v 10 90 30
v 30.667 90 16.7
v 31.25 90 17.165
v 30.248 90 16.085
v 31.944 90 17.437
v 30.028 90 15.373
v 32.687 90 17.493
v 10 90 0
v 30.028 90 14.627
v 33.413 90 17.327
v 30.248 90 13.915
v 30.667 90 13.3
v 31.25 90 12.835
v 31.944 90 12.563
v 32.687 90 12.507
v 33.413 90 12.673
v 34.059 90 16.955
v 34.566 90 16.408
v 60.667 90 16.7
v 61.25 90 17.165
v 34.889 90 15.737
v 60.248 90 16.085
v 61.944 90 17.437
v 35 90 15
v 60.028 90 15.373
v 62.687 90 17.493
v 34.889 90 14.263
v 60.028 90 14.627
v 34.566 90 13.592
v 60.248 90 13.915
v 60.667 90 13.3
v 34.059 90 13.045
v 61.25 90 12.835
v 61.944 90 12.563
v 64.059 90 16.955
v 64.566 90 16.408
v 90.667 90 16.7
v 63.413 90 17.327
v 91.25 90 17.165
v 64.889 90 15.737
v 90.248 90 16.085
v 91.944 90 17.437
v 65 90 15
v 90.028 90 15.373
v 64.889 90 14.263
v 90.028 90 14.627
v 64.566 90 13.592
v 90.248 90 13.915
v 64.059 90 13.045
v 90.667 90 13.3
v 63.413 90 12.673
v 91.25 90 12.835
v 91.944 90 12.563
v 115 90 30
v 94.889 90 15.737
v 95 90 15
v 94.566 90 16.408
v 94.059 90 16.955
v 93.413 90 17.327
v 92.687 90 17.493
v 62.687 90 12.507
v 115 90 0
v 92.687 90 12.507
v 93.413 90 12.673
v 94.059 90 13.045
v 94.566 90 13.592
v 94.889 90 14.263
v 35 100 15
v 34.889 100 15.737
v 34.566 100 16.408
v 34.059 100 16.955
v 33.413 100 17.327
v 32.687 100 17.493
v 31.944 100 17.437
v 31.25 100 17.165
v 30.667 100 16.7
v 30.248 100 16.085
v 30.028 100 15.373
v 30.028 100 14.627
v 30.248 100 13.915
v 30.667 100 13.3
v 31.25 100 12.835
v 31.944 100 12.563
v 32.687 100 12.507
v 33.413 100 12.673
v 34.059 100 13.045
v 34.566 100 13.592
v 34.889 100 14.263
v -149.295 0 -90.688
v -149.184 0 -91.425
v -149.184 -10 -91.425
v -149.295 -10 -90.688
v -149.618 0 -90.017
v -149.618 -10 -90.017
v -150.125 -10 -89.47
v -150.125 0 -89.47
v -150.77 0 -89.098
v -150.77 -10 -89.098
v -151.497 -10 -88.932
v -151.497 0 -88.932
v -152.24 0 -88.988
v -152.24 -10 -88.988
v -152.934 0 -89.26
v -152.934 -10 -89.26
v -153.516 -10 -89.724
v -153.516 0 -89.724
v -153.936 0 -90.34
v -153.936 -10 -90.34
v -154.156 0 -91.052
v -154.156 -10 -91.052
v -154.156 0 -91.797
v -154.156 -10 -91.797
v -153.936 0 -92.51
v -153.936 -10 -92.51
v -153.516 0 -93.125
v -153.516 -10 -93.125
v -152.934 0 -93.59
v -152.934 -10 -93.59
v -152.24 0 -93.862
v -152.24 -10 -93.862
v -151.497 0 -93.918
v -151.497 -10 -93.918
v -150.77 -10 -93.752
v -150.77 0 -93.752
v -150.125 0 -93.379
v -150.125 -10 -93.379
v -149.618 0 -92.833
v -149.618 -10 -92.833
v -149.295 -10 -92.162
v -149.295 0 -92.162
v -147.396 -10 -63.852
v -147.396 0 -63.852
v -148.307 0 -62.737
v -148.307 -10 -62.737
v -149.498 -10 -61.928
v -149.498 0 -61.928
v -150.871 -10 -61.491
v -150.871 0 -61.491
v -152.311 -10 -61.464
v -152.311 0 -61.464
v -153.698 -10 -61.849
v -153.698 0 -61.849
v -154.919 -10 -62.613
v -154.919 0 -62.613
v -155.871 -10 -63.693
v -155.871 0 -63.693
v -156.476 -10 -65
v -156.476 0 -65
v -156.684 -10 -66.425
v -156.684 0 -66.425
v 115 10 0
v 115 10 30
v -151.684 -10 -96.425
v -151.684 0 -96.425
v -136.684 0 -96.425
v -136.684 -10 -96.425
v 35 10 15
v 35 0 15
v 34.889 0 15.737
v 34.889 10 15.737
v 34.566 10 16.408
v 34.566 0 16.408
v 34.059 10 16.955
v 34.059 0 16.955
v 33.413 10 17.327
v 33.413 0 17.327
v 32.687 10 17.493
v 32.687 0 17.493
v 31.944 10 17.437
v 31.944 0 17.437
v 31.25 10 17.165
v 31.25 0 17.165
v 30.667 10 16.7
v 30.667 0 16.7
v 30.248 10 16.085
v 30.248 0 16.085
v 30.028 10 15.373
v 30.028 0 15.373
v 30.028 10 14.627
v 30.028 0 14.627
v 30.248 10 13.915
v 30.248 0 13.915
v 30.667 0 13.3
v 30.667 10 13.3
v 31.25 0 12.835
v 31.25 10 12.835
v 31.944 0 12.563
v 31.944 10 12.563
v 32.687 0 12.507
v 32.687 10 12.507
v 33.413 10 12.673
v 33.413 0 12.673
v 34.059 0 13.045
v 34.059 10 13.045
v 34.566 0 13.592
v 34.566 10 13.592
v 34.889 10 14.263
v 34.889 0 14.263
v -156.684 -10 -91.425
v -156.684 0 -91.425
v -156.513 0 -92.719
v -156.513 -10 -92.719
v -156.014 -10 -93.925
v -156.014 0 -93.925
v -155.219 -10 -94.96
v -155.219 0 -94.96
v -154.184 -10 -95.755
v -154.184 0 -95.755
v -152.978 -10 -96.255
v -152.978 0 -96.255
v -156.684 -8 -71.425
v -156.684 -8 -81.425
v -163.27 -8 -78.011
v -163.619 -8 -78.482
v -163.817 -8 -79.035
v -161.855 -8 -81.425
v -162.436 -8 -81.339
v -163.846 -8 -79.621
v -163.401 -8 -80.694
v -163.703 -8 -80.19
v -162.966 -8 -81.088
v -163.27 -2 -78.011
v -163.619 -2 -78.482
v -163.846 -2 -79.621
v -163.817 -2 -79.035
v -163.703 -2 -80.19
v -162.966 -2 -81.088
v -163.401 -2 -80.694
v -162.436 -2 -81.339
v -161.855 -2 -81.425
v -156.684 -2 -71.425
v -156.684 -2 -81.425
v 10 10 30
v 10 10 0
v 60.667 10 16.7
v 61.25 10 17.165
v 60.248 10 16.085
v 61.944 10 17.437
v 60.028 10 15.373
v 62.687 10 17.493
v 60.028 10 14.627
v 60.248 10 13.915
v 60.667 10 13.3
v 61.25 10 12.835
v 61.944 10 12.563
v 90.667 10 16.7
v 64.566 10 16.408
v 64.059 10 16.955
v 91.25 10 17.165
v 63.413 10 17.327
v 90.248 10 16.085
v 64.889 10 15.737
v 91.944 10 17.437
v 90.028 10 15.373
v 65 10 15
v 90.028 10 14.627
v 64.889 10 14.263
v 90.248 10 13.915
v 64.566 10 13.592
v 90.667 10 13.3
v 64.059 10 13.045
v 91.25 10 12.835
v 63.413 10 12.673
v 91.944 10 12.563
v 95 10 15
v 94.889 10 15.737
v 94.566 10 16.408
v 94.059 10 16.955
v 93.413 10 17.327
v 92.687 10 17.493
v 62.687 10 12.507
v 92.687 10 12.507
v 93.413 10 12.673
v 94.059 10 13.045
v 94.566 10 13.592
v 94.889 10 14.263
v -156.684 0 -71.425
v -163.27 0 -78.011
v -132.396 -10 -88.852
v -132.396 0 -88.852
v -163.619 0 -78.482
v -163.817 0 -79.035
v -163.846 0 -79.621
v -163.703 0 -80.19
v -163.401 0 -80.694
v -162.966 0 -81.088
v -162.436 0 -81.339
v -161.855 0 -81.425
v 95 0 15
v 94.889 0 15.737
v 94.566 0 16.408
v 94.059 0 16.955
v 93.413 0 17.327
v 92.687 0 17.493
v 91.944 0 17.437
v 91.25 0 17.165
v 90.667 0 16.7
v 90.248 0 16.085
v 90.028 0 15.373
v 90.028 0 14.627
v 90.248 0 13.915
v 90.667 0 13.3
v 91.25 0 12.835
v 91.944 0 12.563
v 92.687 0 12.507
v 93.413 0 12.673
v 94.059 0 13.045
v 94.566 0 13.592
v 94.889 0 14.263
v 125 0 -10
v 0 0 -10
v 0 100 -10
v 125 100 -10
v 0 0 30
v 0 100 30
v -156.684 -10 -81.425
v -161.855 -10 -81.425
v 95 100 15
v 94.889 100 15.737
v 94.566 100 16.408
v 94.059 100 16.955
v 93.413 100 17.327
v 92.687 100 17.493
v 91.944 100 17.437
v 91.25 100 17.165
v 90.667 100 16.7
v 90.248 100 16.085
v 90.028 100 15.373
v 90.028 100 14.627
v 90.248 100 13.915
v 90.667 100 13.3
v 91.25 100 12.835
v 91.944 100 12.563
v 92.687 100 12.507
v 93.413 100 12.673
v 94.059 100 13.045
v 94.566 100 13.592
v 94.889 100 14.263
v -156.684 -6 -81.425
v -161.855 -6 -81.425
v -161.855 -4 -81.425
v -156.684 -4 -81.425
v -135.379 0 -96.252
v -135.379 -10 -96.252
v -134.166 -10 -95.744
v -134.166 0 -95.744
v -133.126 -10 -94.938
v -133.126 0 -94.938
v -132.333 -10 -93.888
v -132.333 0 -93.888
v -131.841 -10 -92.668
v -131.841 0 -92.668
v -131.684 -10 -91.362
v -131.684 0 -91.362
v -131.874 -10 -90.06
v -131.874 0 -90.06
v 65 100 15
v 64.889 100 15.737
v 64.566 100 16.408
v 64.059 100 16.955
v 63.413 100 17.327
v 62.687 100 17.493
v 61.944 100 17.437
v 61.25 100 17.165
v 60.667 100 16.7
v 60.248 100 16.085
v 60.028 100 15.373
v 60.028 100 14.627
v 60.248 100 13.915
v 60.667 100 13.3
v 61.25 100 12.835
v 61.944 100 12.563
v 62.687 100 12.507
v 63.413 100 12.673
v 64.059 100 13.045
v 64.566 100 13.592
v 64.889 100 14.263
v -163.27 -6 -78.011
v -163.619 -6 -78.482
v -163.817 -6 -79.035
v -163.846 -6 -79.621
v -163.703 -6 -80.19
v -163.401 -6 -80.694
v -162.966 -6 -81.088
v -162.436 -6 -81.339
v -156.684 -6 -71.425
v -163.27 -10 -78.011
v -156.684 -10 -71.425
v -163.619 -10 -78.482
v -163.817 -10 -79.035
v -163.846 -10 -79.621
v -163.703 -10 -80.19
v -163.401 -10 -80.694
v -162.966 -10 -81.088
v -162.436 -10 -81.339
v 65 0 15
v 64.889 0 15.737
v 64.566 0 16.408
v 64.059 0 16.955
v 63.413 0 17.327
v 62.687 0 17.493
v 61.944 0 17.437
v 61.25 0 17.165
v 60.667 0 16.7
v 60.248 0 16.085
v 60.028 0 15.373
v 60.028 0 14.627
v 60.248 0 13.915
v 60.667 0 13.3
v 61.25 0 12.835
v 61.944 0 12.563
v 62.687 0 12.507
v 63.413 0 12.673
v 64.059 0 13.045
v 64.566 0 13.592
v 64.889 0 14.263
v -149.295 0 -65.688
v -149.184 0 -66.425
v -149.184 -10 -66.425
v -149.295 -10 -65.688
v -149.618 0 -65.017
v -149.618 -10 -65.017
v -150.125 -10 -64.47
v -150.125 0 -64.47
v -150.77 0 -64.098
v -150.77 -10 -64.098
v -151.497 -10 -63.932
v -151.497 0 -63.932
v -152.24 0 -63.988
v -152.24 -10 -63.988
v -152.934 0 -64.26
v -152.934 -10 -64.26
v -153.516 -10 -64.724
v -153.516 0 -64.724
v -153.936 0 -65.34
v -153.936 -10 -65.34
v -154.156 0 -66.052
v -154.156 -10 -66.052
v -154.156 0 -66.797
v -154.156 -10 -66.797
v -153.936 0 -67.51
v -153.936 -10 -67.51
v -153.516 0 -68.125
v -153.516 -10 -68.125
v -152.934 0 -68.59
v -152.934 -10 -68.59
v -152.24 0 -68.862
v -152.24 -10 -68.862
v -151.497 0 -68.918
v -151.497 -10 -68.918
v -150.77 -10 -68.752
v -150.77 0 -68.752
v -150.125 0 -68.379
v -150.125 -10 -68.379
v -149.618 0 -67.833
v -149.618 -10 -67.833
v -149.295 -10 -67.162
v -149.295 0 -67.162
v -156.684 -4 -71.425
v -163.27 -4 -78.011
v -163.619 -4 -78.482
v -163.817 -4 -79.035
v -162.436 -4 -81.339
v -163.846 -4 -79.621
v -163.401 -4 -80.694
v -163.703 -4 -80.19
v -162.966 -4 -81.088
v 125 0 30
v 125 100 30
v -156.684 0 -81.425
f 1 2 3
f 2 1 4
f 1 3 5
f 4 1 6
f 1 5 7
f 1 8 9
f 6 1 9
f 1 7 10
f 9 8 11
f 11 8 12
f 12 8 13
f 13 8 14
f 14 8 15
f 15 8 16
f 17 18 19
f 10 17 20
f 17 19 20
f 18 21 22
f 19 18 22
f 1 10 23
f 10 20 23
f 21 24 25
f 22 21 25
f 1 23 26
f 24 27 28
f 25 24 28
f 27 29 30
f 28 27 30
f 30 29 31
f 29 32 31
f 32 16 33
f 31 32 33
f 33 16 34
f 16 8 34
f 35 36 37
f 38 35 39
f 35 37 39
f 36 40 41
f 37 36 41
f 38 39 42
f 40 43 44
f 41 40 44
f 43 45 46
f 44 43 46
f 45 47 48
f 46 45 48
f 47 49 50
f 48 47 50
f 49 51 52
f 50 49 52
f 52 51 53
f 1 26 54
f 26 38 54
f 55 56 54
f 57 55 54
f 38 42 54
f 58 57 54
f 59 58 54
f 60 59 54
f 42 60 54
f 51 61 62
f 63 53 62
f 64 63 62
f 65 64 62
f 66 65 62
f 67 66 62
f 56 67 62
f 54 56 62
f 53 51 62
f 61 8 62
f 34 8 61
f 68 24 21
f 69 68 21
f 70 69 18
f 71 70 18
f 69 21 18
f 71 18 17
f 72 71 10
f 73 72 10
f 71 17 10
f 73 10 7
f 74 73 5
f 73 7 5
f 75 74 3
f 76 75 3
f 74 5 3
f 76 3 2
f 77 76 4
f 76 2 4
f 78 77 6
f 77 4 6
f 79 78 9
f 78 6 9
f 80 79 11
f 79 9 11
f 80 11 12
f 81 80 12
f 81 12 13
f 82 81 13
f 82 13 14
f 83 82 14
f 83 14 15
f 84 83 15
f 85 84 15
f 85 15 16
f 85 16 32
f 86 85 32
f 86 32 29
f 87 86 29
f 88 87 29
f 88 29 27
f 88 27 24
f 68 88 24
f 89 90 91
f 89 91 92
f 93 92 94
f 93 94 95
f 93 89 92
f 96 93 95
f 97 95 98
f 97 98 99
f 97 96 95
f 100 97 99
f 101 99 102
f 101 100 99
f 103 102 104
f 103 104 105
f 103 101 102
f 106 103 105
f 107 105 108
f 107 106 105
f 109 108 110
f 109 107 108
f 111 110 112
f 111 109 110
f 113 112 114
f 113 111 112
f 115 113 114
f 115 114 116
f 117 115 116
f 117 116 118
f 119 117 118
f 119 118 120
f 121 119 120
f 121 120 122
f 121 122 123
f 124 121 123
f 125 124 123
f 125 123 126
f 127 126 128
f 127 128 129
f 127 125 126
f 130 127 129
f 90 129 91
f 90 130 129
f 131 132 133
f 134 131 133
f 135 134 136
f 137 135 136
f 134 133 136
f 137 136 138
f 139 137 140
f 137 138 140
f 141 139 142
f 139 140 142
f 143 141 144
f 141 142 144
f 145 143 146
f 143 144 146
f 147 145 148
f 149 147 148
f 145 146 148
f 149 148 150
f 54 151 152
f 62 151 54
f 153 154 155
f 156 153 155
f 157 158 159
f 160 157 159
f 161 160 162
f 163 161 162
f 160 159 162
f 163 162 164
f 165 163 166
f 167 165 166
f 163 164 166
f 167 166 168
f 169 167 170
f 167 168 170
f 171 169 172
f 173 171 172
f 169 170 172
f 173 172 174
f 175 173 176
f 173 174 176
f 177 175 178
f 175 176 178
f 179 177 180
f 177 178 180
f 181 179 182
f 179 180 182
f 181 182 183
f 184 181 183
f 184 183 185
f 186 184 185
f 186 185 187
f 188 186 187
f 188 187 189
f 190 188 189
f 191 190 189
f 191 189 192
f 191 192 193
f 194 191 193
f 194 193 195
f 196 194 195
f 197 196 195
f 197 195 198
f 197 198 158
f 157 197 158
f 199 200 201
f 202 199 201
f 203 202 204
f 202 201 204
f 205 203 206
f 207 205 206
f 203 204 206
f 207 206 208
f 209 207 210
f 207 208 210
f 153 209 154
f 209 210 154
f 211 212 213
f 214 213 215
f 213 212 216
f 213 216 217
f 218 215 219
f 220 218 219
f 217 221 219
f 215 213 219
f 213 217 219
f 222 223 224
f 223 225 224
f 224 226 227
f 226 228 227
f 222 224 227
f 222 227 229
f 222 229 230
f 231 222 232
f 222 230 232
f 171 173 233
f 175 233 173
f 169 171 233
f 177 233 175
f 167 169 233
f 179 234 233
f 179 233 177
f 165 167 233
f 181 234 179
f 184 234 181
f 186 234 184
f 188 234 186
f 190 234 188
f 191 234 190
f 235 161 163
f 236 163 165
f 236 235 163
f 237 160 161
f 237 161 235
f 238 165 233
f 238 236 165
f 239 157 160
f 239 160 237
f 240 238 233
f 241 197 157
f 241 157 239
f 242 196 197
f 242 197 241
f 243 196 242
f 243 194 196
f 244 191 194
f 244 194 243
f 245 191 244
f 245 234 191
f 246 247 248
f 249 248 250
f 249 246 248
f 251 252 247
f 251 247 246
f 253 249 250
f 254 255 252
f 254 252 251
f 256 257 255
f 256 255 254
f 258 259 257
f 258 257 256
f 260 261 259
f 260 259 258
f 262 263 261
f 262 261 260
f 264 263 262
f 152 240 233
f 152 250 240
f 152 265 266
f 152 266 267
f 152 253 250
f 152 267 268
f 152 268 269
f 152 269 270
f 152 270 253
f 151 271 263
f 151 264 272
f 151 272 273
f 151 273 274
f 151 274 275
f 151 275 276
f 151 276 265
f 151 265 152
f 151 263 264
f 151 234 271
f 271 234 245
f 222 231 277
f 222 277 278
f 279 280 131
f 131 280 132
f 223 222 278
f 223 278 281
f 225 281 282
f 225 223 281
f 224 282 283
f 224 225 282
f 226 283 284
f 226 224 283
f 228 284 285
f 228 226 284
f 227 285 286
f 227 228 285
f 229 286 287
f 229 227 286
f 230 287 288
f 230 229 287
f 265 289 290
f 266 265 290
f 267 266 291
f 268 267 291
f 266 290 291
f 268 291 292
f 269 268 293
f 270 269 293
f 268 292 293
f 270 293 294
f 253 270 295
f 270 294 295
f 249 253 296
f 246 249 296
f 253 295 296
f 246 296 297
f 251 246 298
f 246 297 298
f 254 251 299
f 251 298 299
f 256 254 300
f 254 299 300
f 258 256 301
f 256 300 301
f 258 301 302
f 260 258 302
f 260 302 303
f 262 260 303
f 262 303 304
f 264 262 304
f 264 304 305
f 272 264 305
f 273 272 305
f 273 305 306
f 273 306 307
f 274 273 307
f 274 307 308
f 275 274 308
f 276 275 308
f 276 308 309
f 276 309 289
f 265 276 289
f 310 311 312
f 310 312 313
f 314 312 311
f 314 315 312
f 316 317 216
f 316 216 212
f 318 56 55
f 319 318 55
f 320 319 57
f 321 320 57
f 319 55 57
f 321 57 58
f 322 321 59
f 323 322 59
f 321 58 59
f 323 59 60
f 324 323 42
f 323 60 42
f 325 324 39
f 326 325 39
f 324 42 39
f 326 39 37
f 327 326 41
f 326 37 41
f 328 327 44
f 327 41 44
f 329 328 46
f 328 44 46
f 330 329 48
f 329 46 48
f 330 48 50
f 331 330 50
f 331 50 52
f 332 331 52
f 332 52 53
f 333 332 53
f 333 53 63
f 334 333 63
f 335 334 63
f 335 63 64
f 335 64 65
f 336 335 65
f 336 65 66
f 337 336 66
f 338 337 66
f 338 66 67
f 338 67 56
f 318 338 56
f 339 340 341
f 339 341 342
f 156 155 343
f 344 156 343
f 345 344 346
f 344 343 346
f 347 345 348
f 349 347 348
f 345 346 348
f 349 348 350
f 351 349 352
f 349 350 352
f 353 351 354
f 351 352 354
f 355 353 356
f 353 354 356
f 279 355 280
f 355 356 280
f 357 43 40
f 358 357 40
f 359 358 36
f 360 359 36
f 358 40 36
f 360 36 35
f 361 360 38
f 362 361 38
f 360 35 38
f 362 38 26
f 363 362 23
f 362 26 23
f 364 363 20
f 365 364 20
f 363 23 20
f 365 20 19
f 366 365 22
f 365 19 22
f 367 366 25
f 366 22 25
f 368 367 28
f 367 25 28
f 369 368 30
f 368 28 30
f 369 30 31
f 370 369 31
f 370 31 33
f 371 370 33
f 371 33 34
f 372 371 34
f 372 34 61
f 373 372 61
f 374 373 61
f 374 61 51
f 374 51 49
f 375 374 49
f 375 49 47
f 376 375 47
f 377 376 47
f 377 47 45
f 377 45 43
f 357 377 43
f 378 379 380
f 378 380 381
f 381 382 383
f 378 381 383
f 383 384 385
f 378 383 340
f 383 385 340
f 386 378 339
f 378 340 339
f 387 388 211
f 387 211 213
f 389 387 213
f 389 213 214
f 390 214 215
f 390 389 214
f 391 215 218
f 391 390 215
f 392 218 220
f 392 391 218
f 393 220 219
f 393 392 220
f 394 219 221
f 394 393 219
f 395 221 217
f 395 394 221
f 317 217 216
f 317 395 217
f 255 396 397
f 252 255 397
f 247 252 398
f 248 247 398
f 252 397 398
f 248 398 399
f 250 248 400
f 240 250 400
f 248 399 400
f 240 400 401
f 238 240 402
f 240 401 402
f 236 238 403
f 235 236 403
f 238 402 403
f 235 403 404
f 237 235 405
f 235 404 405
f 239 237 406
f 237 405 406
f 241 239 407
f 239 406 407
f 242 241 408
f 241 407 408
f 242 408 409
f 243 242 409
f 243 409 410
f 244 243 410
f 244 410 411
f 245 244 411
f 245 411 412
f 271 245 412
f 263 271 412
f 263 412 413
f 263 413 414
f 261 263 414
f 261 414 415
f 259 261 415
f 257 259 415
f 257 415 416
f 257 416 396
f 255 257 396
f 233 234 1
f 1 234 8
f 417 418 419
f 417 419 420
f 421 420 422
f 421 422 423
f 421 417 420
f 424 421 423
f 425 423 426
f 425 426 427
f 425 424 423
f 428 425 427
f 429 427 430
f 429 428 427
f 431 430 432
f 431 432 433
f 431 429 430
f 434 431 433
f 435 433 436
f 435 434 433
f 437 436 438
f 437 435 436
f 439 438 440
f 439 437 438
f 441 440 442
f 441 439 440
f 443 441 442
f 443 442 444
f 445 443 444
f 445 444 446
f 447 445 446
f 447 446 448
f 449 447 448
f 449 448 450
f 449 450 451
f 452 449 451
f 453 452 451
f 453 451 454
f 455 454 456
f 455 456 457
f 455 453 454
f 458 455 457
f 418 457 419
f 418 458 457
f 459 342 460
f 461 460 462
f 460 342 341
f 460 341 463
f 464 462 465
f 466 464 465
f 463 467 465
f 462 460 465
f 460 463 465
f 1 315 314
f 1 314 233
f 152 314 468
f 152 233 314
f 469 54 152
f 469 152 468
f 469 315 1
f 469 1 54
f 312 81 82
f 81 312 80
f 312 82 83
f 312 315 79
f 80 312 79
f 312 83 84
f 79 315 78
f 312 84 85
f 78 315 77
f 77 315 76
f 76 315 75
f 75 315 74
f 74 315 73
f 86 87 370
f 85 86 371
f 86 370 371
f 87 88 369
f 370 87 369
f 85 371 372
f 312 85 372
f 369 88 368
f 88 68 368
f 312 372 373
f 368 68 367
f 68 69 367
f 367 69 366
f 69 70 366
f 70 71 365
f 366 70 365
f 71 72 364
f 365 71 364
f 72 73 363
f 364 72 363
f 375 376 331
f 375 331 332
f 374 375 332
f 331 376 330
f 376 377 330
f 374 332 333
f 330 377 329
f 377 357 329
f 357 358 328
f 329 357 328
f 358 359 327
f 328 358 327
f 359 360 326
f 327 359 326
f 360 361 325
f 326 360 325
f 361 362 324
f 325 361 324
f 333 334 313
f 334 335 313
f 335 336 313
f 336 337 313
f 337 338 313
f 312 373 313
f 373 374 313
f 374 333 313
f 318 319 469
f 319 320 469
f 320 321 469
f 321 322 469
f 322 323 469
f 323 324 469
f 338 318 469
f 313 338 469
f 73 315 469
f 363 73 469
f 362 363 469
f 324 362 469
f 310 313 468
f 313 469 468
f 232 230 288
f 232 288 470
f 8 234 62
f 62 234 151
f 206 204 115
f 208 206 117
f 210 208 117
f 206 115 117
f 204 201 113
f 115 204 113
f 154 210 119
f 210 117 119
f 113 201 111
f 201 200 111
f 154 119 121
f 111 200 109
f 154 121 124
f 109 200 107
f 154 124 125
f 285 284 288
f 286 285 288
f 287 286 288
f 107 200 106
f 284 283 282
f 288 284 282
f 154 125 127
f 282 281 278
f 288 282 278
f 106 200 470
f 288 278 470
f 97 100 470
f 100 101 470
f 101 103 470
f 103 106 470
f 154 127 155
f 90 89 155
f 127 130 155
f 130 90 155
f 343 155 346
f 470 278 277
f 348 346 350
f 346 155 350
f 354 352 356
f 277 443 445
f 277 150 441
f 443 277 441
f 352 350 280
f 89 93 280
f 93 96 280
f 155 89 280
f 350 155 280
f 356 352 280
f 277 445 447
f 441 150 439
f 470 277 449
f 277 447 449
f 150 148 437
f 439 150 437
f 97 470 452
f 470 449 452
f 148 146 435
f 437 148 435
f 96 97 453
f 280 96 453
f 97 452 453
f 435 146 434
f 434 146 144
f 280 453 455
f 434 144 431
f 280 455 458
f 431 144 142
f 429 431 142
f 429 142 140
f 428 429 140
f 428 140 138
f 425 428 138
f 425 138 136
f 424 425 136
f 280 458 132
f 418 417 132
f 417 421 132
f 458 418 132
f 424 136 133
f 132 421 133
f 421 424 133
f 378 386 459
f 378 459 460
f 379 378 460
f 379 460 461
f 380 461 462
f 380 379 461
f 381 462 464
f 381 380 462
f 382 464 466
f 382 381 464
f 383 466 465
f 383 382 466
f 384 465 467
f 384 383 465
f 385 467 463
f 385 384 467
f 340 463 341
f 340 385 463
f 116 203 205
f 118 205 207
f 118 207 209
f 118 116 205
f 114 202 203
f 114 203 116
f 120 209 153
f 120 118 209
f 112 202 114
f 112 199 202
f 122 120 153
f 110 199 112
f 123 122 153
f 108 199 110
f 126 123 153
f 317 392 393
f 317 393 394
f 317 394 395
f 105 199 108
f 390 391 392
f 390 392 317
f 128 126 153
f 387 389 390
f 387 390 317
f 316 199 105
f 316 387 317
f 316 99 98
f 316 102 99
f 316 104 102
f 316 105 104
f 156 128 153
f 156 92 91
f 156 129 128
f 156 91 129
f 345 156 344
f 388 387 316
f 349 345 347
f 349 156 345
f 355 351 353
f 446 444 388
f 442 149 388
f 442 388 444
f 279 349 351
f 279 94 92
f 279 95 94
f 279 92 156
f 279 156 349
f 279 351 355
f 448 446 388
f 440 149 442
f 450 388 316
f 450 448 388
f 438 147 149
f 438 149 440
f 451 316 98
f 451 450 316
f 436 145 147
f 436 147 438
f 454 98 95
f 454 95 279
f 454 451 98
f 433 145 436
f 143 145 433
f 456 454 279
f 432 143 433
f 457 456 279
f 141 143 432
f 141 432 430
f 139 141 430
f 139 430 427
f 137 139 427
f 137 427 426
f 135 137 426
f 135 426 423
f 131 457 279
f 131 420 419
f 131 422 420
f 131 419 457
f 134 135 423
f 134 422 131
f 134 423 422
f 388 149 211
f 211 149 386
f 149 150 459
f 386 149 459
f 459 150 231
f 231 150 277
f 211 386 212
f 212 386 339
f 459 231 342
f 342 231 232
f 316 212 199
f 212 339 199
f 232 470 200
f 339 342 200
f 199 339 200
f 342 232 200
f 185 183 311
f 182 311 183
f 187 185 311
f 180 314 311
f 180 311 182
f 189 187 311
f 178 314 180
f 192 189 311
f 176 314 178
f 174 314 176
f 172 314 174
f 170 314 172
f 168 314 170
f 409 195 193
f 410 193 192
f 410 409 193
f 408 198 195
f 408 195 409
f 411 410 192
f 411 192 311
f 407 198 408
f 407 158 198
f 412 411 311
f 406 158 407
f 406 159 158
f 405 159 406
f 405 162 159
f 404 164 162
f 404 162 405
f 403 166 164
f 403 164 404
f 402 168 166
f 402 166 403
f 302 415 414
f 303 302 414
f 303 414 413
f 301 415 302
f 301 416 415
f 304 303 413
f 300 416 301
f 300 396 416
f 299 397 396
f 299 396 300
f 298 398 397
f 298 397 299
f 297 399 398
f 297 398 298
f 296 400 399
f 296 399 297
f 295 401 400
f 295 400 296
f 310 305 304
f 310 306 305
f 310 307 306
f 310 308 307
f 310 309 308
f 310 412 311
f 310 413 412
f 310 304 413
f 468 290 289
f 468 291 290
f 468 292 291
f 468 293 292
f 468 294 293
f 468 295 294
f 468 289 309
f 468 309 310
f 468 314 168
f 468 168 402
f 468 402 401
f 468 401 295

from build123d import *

# Parameters (mm, degrees)
F0_W      = 125
F0_H      = 100
F0_W_2    = 105
F0_H_2    = 80
F1_DEPTH  = 30
F2_R      = 2.5
F3_DEPTH  = 100.001
F4_W      = 125
F4_H      = 100
F4_W_2    = 105
F4_H_2    = 80
F5_DEPTH  = 10
F7_R      = 2.5
F8_DEPTH  = 10
F10_DEPTH = 10
F11_W     = 11.9066902784
F11_H     = 2
F11_W_2   = 5.1715728753
F11_W_3   = 11.2758645205
F12_DEPTH = 25


with BuildPart() as f1:
    # F0 (on Top) → F1 (new body)
    with BuildSketch(Plane.XY):
        with Locations((62.5, 50)):
            Rectangle(F0_W, F0_H)
        with Locations((62.5, 50)):
            Rectangle(F0_W_2, F0_H_2, mode=Mode.SUBTRACT)
    extrude(amount=F1_DEPTH)

    # F2 (on face) → F3 (cut, through all)
    with BuildSketch(Plane.XZ):
        with Locations((32.5, 15)):
            Circle(F2_R)
        with Locations((62.5, 15)):
            Circle(F2_R)
        with Locations((92.5, 15)):
            Circle(F2_R)
    extrude(amount=-F3_DEPTH, mode=Mode.SUBTRACT)

    # F4 (on face) → F5 (join)
    with BuildSketch(Plane(origin=(0, 0, 0), x_dir=(1, 0, 0), z_dir=(0, 0, -1))):
        with Locations((62.5, -50)):
            Rectangle(F4_W, F4_H)
        with Locations((62.5, -50)):
            Rectangle(F4_W_2, F4_H_2, mode=Mode.SUBTRACT)
        with Locations((62.5, -50)):
            Rectangle(F4_W_2, F4_H_2)
    extrude(amount=F5_DEPTH)


with BuildPart() as f8:
    # F7 (on Front) → F8 (new body)
    with BuildSketch(Plane.XZ):
        with BuildLine():
            ThreePointArc((-147.3962509632, -63.8523980975), (-153.0183835013, -61.6063022336), (-156.6837155918, -66.4248768747))
            Line((-156.6837155918, -66.4248768747), (-156.6837155918, -91.4248768747))
            ThreePointArc((-156.6837155918, -91.4248768747), (-155.2192494977, -94.9604107806), (-151.6837155918, -96.4248768747))
            Line((-151.6837155918, -96.4248768747), (-136.6837155918, -96.4248768747))
            ThreePointArc((-136.6837155918, -96.4248768747), (-132.332716058, -93.8883709496), (-132.3962509632, -88.8523980975))
            Line((-132.3962509632, -88.8523980975), (-147.3962509632, -63.8523980975))
        make_face()
        with Locations((-151.6837155918, -91.4248768747)):
            Circle(F7_R, mode=Mode.SUBTRACT)
        with Locations((-151.6837155918, -66.4248768747)):
            Circle(F7_R, mode=Mode.SUBTRACT)
    extrude(amount=F8_DEPTH)

    # F9 (on face) → F10 (join)
    with BuildSketch(Plane.XZ.offset(10)):
        with BuildLine():
            Line((-156.6837155918, -81.4248768747), (-156.6837155918, -71.4248768747))
            Line((-156.6837155918, -71.4248768747), (-163.2695020294, -78.0106633123))
            ThreePointArc((-163.2695020294, -78.0106633123), (-163.7030475321, -80.1902437394), (-161.855288467, -81.4248768747))
            Line((-161.855288467, -81.4248768747), (-156.6837155918, -81.4248768747))
        make_face()
    extrude(amount=-F10_DEPTH)

    # F11 (on face) → F12 (cut)
    with BuildSketch(Plane(origin=(0, 0, -81.4248768747), x_dir=(1, 0, 0), z_dir=(0, 0, -1))):
        with Locations((-167.8086336062, 7)):
            Rectangle(F11_W, F11_H)
        with Locations((-159.2695020294, 3)):
            Rectangle(F11_W_2, F11_H)
        with Locations((-159.2695020294, 7)):
            Rectangle(F11_W_2, F11_H)
        with Locations((-167.4932207273, 3)):
            Rectangle(F11_W_3, F11_H)
    extrude(amount=-F12_DEPTH, mode=Mode.SUBTRACT)


solid = Compound([f1.part, f8.part])
